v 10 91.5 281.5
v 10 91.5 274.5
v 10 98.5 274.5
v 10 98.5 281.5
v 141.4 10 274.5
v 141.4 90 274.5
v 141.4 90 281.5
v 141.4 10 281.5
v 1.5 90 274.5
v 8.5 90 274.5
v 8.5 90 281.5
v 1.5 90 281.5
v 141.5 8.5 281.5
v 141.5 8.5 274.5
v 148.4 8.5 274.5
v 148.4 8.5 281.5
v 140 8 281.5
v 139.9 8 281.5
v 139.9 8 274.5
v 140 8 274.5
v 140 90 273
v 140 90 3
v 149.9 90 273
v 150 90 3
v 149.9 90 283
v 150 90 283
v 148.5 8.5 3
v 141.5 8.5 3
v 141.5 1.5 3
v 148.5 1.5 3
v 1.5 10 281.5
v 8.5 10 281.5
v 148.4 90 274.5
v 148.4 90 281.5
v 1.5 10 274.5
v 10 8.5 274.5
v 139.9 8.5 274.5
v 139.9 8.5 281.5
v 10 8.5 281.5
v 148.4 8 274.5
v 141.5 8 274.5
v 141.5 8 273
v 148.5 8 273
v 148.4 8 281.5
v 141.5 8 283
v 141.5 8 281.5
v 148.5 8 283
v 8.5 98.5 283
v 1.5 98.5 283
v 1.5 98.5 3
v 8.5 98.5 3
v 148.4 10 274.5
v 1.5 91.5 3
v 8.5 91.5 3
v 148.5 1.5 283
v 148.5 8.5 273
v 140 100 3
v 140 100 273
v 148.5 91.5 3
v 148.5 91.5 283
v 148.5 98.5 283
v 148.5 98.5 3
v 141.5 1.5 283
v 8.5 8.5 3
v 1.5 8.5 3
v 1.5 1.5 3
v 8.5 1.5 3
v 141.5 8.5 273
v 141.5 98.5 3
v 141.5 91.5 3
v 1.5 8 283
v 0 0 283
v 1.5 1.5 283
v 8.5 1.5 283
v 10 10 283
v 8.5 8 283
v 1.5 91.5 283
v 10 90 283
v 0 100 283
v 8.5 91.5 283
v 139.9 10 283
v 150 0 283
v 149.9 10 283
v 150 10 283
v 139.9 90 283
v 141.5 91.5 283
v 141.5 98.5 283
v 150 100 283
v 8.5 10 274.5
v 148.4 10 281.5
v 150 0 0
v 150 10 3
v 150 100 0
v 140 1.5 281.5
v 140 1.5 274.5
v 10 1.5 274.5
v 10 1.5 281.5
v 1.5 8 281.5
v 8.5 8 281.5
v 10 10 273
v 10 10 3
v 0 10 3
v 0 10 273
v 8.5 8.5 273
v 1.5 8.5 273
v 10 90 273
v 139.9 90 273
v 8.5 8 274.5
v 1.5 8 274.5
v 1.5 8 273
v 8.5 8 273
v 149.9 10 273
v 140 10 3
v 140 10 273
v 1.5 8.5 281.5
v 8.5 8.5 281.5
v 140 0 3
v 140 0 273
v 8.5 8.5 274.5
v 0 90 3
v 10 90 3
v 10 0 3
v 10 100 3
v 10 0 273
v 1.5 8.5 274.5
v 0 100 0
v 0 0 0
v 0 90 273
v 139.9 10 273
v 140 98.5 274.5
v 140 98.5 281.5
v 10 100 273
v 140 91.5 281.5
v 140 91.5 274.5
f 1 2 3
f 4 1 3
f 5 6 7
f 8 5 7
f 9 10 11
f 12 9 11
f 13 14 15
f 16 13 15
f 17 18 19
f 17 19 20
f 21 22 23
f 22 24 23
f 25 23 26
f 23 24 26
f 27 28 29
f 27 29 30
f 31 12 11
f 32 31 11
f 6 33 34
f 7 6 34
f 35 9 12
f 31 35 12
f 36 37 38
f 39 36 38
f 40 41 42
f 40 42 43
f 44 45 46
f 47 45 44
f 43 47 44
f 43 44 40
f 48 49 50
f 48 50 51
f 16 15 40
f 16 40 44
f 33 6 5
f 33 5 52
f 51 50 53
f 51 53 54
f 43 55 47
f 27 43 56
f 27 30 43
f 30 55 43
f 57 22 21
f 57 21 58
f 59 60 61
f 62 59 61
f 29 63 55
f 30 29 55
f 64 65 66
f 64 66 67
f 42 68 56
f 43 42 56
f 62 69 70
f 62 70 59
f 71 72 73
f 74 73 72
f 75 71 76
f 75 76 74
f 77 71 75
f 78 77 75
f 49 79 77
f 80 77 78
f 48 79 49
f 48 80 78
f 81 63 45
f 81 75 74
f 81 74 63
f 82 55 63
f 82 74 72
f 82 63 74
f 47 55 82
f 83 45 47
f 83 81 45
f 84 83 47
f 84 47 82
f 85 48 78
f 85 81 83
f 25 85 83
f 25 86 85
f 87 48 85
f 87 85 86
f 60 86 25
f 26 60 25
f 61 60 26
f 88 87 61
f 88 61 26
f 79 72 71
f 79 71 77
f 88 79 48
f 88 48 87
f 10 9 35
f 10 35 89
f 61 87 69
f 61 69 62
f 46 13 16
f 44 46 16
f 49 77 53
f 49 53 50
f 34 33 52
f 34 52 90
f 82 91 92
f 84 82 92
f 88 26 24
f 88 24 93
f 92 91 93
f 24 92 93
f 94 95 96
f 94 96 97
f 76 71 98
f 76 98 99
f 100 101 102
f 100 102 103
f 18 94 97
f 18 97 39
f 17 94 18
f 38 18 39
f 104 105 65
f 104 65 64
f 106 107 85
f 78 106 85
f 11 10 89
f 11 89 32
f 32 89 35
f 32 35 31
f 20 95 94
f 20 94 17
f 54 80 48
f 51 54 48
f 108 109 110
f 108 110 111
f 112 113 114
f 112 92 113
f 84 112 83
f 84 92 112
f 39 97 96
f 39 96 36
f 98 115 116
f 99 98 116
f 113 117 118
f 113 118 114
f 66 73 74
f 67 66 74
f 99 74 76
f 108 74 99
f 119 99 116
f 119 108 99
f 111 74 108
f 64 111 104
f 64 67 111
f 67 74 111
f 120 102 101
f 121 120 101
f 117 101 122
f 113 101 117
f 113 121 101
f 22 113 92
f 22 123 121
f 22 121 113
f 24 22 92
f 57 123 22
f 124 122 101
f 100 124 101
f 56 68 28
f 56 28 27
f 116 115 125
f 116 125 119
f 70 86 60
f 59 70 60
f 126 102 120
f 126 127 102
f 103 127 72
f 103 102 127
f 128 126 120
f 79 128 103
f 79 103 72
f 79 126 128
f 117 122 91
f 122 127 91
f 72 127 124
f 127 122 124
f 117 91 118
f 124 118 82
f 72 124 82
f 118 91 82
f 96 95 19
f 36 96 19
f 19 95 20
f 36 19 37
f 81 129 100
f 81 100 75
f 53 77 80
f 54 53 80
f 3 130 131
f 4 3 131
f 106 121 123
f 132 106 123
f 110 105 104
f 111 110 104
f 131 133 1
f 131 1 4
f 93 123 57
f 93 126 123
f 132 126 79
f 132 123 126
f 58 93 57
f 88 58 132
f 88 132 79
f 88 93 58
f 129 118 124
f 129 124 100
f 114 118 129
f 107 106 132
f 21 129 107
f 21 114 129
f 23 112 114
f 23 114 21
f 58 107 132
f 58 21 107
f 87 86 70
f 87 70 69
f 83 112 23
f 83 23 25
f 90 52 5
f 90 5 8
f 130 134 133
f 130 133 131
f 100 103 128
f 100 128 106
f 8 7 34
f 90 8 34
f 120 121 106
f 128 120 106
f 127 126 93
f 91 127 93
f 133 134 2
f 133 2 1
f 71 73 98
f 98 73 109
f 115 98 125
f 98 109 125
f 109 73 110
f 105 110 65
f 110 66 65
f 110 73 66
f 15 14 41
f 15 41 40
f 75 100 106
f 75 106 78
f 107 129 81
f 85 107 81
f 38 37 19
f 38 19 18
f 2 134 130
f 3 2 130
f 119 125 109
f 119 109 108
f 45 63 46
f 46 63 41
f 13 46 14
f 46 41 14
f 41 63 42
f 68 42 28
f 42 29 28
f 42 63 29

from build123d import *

# Parameters (mm, degrees)
SKETCH1_W           = 150
SKETCH1_H           = 100
BOSS_EXTRUDE1_DEPTH = 3
SKETCH2_W           = 10
SKETCH2_H           = 10
SKETCH2_W_2         = 7
SKETCH2_H_2         = 7
BOSS_EXTRUDE2_DEPTH = 280
SKETCH3_W           = 10
SKETCH3_H           = 10
SKETCH3_W_2         = 7
SKETCH3_H_2         = 7
BOSS_EXTRUDE3_DEPTH = 130
SKETCH4_W           = 10
SKETCH4_H           = 10
SKETCH4_W_2         = 7
SKETCH4_H_2         = 7
BOSS_EXTRUDE4_DEPTH = 130
SKETCH5_W           = 10
SKETCH5_H           = 10
SKETCH5_W_2         = 7
SKETCH5_H_2         = 7
BOSS_EXTRUDE5_DEPTH = 82


with BuildPart() as part:
    # Sketch1 → Boss-Extrude1 (new body)
    with BuildSketch(Plane.XY):
        with Locations((75, 50)):
            Rectangle(SKETCH1_W, SKETCH1_H)
    extrude(amount=BOSS_EXTRUDE1_DEPTH)

    # Sketch2 → Boss-Extrude2 (add)
    # profile 1 of 4: a face of its own
    with BuildSketch(Plane.XY.offset(3)):
        with Locations((145, 95)):
            Rectangle(SKETCH2_W, SKETCH2_H)
        with Locations((145, 95)):
            Rectangle(SKETCH2_W_2, SKETCH2_H_2, mode=Mode.SUBTRACT)
    # profile 2 of 4: a face of its own
    with BuildSketch(Plane.XY.offset(3)):
        with Locations((145, 5)):
            Rectangle(SKETCH2_W, SKETCH2_H)
        with Locations((145, 5)):
            Rectangle(SKETCH2_W_2, SKETCH2_H_2, mode=Mode.SUBTRACT)
    # profile 3 of 4: a face of its own
    with BuildSketch(Plane.XY.offset(3)):
        with Locations((5, 5)):
            Rectangle(SKETCH2_W, SKETCH2_H)
        with Locations((5, 5)):
            Rectangle(SKETCH2_W_2, SKETCH2_H_2, mode=Mode.SUBTRACT)
    # profile 4 of 4: a face of its own
    with BuildSketch(Plane.XY.offset(3)):
        with Locations((5, 95)):
            Rectangle(SKETCH2_W, SKETCH2_H)
        with Locations((5, 95)):
            Rectangle(SKETCH2_W_2, SKETCH2_H_2, mode=Mode.SUBTRACT)
    extrude(amount=BOSS_EXTRUDE2_DEPTH)

    # Sketch3 → Boss-Extrude3 (add)
    with BuildSketch(Plane.ZY.offset(-140)):
        with Locations((278, 95)):
            Rectangle(SKETCH3_W, SKETCH3_H)
        with Locations((278, 95)):
            Rectangle(SKETCH3_W_2, SKETCH3_H_2, mode=Mode.SUBTRACT)
    extrude(amount=BOSS_EXTRUDE3_DEPTH)

    # Sketch4 → Boss-Extrude4 (add)
    with BuildSketch(Plane.ZY.offset(-140)):
        with Locations((278, 5)):
            Rectangle(SKETCH4_W, SKETCH4_H)
        with Locations((278, 5)):
            Rectangle(SKETCH4_W_2, SKETCH4_H_2, mode=Mode.SUBTRACT)
    extrude(amount=BOSS_EXTRUDE4_DEPTH)

    # Sketch5 → Boss-Extrude5 (add)
    # profile 1 of 2: a face of its own
    with BuildSketch(Plane.XZ.offset(-90)):
        with Locations((5, 278)):
            Rectangle(SKETCH5_W, SKETCH5_H)
        with Locations((5, 278)):
            Rectangle(SKETCH5_W_2, SKETCH5_H_2, mode=Mode.SUBTRACT)
    # profile 2 of 2: a face of its own
    with BuildSketch(Plane.XZ.offset(-90)):
        with Locations((144.9, 278)):
            Rectangle(SKETCH5_W, SKETCH5_H)
        with Locations((144.9, 278)):
            Rectangle(SKETCH5_W_2, SKETCH5_H_2, mode=Mode.SUBTRACT)
    extrude(amount=BOSS_EXTRUDE5_DEPTH)


solid = part.part
